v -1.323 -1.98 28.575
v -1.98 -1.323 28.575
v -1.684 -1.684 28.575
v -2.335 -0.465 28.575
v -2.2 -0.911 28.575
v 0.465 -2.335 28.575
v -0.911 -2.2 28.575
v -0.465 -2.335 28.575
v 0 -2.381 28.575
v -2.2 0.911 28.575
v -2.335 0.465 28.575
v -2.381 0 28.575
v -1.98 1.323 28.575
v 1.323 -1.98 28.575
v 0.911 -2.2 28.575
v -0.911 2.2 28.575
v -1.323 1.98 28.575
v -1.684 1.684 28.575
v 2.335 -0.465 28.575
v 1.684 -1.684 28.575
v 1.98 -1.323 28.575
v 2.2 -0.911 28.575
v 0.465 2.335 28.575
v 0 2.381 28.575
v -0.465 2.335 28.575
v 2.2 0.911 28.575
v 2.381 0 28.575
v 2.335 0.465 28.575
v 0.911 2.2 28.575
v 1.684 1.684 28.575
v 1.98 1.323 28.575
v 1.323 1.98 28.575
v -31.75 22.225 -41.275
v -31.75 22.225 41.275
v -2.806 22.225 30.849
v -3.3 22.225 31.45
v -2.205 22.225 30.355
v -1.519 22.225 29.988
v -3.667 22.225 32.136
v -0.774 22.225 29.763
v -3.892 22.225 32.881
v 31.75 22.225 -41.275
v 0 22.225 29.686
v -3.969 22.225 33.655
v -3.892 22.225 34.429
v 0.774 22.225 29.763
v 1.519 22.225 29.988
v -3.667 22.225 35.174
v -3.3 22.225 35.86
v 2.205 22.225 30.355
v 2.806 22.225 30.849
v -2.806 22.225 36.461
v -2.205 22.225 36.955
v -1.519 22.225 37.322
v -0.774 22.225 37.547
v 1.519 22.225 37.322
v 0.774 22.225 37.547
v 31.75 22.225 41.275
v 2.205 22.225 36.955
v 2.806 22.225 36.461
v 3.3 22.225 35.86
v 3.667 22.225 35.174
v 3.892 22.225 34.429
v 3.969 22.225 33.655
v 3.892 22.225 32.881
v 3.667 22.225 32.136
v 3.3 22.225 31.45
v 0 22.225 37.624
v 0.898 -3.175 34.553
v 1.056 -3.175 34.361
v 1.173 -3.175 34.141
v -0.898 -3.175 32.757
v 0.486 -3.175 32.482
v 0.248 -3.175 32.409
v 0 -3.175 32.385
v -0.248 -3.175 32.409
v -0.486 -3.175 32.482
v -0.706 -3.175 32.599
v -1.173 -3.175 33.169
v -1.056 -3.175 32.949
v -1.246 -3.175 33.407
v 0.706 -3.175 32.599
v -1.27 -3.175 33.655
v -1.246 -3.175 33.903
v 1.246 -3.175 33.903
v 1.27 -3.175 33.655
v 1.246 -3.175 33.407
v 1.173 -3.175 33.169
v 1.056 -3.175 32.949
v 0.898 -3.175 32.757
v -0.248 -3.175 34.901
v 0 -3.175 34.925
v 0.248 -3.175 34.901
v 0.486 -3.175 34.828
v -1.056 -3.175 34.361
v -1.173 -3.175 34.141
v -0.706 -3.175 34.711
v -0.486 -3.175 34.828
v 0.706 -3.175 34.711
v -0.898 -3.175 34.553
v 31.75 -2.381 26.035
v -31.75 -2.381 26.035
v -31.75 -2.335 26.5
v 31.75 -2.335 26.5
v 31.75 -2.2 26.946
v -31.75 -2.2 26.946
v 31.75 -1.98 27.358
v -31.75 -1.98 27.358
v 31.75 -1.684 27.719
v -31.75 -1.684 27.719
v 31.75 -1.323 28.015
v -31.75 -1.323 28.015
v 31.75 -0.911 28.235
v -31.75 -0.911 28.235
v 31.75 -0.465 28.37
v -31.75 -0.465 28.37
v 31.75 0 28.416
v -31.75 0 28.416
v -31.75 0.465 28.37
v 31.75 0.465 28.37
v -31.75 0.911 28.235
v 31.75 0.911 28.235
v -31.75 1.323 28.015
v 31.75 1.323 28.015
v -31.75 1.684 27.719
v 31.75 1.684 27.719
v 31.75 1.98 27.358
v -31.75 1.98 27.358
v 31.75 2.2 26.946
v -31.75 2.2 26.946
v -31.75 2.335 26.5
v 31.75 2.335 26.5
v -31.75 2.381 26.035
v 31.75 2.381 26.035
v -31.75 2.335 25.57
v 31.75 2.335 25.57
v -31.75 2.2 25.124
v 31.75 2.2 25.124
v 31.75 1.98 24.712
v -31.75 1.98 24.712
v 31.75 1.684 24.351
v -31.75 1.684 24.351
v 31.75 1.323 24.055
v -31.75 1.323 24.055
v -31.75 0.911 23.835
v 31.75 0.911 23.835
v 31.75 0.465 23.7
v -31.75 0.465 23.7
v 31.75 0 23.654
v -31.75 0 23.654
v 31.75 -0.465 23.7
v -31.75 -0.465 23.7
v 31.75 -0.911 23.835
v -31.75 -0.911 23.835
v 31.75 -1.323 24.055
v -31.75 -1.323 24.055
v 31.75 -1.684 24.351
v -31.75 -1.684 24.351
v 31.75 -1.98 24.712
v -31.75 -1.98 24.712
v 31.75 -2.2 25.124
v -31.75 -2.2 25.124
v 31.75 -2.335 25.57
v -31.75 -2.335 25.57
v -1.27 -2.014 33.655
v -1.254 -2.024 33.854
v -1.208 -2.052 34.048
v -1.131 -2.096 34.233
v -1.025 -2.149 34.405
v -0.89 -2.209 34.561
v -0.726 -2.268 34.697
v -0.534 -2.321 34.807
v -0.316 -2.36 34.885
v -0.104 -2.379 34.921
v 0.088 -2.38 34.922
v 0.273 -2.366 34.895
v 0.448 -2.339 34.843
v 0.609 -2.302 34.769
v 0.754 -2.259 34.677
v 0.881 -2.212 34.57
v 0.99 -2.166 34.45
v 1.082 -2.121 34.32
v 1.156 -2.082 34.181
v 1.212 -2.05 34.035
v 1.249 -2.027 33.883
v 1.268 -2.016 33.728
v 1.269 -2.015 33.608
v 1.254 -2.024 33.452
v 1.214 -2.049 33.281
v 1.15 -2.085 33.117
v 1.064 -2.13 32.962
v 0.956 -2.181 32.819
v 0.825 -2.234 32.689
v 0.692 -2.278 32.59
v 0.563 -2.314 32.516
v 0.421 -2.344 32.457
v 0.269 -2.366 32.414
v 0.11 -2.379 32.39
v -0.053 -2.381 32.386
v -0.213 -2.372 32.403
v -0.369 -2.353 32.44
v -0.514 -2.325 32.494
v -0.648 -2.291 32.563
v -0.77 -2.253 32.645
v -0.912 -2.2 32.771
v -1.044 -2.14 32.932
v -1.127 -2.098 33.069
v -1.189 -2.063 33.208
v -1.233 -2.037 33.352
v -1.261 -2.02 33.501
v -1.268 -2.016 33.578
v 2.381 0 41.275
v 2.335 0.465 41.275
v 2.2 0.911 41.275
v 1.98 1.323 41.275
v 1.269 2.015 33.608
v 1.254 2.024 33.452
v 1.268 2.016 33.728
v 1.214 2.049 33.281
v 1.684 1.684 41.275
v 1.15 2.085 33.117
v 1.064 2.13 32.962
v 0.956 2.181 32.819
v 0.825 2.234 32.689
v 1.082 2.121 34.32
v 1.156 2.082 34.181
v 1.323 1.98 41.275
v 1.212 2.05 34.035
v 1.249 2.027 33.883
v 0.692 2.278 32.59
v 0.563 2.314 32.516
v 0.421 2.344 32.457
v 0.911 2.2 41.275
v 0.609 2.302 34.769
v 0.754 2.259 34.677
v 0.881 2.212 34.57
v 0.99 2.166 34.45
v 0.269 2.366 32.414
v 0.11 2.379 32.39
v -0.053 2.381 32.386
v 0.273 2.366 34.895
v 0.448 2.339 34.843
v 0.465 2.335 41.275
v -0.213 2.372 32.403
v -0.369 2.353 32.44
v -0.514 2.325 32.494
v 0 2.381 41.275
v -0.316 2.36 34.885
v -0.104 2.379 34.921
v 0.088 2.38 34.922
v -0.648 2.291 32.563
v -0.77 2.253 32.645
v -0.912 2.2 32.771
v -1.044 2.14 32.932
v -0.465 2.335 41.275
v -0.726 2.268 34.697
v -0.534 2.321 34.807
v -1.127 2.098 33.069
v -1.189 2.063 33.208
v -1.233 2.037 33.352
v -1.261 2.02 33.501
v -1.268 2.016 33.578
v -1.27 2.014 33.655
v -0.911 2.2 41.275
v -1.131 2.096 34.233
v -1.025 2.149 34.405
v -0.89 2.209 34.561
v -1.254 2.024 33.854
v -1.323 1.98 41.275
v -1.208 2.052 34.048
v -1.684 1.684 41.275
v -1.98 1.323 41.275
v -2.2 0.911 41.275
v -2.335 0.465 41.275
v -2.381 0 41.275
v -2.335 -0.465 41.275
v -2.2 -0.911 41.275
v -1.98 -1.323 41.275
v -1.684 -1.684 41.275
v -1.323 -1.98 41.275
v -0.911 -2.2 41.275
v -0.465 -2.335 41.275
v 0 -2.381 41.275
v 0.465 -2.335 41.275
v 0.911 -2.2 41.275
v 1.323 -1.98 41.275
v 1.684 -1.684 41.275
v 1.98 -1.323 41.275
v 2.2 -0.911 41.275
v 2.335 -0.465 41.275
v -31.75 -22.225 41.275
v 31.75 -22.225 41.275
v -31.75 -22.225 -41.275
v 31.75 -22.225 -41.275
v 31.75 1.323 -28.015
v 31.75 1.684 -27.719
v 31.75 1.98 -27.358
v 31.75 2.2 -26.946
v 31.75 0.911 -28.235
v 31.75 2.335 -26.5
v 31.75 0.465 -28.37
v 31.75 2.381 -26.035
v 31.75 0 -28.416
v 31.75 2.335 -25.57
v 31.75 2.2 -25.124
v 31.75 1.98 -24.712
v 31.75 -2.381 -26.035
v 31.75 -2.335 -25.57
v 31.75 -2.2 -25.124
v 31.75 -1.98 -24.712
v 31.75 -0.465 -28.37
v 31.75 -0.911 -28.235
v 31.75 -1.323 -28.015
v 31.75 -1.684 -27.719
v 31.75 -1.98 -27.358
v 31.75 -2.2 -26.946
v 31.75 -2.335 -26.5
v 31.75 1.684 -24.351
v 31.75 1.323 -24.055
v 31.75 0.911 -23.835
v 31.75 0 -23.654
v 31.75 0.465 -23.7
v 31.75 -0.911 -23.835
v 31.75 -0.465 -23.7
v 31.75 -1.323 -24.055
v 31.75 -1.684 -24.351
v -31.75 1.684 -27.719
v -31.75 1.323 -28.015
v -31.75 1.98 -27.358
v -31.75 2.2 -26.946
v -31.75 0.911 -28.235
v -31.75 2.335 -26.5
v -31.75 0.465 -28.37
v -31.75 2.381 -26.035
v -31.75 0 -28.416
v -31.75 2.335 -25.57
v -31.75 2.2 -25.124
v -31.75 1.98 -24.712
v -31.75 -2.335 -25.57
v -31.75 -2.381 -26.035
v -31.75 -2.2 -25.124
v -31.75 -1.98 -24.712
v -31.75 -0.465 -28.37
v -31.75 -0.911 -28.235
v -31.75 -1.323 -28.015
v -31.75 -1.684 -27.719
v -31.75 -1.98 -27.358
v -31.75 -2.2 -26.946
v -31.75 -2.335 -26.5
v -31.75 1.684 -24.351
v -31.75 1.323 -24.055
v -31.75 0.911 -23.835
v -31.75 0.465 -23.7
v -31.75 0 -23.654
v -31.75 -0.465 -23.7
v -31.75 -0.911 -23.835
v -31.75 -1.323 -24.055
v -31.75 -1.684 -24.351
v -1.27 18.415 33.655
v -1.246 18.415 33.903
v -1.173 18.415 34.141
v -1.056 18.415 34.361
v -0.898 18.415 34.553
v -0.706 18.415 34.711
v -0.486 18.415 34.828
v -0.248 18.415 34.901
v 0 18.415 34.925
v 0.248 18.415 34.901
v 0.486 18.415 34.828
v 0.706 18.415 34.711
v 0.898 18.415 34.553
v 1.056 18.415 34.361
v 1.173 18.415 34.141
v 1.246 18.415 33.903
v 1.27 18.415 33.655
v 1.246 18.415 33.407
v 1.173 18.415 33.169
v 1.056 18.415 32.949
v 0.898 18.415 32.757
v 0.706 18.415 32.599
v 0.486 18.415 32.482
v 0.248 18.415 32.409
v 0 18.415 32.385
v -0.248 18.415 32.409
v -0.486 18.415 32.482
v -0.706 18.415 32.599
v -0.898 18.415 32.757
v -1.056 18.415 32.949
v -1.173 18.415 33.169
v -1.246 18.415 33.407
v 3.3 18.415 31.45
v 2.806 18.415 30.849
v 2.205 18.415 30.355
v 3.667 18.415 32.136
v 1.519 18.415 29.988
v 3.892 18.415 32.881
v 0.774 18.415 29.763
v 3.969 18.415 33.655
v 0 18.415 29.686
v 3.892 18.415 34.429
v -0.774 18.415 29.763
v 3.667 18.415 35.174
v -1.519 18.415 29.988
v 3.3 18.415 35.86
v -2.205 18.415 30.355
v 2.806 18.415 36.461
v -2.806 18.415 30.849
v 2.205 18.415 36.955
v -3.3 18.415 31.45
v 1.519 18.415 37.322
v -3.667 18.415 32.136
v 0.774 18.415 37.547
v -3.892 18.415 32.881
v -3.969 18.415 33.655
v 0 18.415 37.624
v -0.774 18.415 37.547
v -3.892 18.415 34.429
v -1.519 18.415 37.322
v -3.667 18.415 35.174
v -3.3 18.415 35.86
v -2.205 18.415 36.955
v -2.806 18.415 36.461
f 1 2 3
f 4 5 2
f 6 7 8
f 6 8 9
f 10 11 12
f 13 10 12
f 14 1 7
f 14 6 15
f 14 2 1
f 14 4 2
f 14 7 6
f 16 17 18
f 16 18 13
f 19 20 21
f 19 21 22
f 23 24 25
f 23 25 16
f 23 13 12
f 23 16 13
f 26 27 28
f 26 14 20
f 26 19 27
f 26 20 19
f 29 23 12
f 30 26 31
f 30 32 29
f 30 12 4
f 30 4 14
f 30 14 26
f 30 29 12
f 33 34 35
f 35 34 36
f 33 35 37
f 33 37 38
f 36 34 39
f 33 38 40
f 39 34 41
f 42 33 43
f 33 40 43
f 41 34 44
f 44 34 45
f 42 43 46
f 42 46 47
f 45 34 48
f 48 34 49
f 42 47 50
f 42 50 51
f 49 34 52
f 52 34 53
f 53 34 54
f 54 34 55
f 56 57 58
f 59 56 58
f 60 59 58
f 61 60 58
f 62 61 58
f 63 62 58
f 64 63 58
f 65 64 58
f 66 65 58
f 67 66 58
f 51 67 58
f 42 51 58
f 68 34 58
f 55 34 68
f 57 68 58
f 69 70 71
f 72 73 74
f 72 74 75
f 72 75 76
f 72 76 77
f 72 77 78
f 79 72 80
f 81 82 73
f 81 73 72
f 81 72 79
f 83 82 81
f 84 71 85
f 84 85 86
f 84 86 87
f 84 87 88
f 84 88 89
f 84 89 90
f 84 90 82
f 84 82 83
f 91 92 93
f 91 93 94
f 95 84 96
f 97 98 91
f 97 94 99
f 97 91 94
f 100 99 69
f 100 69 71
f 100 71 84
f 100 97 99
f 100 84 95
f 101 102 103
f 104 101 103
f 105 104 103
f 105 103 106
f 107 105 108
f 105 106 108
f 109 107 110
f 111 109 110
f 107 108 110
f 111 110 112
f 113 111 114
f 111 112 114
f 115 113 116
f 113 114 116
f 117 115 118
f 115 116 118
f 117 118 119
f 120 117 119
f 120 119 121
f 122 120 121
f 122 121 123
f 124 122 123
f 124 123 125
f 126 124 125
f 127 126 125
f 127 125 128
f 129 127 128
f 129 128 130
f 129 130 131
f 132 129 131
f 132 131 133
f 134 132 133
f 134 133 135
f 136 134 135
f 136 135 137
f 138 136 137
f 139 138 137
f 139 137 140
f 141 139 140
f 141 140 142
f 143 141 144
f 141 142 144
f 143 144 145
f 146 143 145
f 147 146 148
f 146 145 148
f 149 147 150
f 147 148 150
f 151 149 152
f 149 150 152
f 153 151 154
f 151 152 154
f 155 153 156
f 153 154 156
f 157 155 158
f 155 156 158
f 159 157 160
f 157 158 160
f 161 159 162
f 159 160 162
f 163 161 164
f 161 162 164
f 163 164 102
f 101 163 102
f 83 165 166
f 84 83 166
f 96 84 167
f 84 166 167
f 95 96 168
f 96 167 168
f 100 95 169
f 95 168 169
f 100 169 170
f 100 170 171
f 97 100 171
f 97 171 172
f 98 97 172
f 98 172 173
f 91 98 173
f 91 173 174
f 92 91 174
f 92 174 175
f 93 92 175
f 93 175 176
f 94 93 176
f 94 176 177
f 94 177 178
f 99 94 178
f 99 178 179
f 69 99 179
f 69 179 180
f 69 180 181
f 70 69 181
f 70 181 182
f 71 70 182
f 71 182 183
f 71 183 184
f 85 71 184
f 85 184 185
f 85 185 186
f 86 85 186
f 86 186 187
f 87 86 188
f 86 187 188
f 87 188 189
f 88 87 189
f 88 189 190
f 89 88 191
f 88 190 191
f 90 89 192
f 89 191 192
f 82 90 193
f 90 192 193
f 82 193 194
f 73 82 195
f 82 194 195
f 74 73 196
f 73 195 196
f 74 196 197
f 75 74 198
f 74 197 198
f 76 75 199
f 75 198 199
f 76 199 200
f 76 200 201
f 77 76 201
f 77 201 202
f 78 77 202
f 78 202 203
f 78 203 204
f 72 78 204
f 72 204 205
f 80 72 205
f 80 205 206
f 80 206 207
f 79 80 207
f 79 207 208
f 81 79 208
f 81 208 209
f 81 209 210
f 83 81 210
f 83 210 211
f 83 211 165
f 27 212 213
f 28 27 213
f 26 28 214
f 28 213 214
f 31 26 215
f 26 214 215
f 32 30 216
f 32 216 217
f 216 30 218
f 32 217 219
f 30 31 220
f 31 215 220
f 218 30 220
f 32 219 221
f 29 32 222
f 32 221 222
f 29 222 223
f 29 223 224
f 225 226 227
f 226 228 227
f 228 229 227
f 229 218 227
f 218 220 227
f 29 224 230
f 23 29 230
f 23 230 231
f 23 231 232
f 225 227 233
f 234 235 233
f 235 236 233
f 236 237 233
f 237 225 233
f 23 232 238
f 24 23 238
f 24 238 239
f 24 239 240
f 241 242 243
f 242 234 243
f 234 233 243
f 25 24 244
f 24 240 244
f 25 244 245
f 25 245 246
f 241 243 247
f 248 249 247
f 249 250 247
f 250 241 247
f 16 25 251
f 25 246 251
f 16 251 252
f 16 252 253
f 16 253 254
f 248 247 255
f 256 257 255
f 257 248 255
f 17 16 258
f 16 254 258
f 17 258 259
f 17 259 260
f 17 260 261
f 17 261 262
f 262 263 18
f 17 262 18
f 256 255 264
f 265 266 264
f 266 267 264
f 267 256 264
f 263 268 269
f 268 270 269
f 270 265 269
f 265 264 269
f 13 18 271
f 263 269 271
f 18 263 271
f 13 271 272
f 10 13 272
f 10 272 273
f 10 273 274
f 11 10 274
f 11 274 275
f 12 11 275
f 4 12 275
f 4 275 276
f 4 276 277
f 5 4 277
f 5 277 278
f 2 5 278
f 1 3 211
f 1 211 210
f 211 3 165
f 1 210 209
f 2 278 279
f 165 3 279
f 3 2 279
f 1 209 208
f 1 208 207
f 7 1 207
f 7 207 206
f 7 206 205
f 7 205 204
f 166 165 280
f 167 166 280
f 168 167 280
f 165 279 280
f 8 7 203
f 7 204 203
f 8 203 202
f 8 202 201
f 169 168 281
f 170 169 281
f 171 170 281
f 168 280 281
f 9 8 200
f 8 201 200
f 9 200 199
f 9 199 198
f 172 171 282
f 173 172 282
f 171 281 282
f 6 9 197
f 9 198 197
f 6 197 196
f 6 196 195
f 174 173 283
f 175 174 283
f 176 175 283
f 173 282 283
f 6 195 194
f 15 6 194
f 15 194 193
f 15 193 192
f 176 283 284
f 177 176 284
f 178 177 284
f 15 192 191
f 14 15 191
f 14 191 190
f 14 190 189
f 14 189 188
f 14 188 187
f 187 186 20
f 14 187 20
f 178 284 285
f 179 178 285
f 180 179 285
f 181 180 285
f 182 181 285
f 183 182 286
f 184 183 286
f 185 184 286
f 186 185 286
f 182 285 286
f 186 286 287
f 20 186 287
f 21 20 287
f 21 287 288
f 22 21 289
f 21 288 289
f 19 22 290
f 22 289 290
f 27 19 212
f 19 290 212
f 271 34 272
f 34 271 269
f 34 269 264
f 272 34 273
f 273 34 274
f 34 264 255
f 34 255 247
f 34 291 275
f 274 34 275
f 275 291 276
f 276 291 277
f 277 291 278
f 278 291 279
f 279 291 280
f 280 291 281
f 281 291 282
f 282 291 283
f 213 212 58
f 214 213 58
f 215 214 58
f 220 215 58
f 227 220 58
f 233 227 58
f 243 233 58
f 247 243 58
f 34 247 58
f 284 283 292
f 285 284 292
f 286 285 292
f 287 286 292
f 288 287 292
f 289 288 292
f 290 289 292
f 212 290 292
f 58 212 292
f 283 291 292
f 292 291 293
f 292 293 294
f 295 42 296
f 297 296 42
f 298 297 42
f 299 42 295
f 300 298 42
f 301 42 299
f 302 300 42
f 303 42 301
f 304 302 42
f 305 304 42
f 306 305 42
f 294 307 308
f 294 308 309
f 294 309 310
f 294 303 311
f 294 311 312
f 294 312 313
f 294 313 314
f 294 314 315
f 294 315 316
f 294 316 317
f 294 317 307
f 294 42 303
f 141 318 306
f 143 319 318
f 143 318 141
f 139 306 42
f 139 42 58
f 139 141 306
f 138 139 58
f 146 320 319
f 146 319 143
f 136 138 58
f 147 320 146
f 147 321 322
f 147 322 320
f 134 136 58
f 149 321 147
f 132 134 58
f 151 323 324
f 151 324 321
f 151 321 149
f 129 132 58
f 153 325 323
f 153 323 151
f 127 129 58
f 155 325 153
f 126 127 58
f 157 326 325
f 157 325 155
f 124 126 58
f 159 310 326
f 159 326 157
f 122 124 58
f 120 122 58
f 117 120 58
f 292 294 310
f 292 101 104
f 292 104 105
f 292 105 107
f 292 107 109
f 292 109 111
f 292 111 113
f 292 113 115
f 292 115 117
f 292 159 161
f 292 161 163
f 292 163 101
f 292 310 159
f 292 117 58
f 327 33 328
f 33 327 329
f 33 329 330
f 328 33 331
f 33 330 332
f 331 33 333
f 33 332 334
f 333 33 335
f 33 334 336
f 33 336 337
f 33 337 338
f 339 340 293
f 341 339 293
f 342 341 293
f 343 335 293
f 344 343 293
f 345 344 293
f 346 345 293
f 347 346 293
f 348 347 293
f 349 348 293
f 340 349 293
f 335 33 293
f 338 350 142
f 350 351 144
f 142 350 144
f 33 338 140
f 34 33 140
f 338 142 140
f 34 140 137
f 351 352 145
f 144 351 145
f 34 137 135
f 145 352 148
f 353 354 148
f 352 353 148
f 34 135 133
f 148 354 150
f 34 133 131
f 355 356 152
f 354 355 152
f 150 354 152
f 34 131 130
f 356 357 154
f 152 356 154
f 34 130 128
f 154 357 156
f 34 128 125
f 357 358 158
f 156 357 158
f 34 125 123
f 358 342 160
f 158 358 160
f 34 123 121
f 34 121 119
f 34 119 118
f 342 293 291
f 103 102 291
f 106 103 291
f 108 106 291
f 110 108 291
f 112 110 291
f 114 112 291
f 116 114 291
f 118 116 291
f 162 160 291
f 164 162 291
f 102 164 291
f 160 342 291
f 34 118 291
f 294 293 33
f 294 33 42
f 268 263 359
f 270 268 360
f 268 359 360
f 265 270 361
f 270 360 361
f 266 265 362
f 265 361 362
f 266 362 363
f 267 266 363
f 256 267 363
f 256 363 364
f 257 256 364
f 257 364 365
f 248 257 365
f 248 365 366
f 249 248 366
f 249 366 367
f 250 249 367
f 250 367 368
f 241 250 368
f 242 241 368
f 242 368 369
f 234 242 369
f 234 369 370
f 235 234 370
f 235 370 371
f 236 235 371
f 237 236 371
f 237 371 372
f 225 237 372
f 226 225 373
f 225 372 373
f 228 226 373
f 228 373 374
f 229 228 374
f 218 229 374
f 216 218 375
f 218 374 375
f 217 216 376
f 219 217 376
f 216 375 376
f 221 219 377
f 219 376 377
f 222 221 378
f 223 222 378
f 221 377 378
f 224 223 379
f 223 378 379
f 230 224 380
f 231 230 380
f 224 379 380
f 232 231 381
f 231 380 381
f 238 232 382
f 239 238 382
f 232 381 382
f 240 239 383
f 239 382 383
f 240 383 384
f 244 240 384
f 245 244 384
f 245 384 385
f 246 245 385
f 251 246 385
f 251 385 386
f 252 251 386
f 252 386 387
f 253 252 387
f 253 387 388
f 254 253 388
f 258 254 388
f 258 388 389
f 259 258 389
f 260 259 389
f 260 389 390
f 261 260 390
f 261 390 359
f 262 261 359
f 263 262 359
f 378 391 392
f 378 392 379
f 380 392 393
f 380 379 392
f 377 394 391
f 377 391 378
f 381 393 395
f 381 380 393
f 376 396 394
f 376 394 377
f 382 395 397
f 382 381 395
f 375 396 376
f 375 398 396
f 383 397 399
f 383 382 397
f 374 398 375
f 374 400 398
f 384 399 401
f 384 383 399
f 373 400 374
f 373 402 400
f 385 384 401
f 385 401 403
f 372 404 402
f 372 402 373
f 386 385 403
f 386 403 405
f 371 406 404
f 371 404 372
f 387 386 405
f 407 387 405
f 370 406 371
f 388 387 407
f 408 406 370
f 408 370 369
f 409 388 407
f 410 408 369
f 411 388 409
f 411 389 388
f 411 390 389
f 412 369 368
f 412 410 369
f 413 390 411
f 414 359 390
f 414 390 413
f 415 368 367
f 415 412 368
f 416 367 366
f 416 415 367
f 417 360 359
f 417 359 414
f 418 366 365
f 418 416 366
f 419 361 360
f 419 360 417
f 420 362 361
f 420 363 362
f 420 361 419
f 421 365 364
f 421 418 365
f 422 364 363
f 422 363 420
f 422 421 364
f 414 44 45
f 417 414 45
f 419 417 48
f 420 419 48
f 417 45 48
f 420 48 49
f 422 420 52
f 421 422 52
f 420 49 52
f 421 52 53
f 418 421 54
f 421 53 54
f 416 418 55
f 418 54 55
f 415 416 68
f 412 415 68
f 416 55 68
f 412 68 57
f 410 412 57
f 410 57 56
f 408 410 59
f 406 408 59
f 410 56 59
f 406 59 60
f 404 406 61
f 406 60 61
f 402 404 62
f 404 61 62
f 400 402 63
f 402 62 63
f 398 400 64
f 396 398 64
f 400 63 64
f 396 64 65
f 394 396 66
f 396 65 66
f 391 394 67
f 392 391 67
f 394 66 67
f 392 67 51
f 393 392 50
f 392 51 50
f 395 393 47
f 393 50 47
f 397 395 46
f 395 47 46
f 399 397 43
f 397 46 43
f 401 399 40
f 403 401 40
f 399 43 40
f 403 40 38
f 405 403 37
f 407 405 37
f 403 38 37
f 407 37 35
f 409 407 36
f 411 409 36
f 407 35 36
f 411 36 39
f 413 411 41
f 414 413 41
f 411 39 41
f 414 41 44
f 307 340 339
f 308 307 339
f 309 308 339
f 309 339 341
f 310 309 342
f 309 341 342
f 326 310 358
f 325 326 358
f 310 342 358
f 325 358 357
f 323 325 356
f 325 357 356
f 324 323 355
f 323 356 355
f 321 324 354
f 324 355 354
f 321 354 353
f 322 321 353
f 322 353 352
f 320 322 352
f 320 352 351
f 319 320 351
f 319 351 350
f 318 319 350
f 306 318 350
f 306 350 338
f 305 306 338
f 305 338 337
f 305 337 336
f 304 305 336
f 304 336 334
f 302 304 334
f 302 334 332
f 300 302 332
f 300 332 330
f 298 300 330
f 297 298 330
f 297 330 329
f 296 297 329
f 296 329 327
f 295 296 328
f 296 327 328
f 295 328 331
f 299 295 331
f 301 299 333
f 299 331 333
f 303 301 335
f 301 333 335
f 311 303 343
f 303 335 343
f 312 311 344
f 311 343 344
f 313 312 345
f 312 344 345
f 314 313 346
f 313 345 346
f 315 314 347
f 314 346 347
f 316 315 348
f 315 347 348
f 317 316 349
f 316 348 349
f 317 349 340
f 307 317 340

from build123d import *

# Parameters (mm, degrees)
F0_W     = 63.5
F0_H     = 82.55
F1_DEPTH = 22.225
F2_R     = 2.38125
F3_DEPTH = 12.7
F4_R     = 2.38125
F5_DEPTH = 63.501
F6_R     = 1.27
F7_DEPTH = 25.4
F8_R     = 3.96875
F9_DEPTH = 3.81


with BuildPart() as f1:
    # F0 (on Front) → F1 (new body, symmetric)
    with BuildSketch(Plane.XZ):
        Rectangle(F0_W, F0_H)
    extrude(amount=F1_DEPTH, both=True)

    # F2 (on face) → F3 (cut)
    with BuildSketch(Plane.XY.offset(41.275)):
        Circle(F2_R)
    extrude(amount=-F3_DEPTH, mode=Mode.SUBTRACT)

    # F4 (on face) → F5 (cut, through all)
    with BuildSketch(Plane(origin=(-31.75, 0, 0), x_dir=(0, -1, 0), z_dir=(-1, 0, 0))):
        with Locations((0, 26.035)):
            Circle(F4_R)
        with Locations((0, -26.035)):
            Circle(F4_R)
    extrude(amount=-F5_DEPTH, mode=Mode.SUBTRACT)

    # F6 (on face) → F7 (cut)
    with BuildSketch(Plane(origin=(0, 22.225, 0), x_dir=(-1, 0, 0), z_dir=(0, 1, 0))):
        with Locations((0, 33.655)):
            Circle(F6_R)
    extrude(amount=-F7_DEPTH, mode=Mode.SUBTRACT)

    # F8 (on face) → F9 (cut)
    with BuildSketch(Plane(origin=(0, 22.225, 0), x_dir=(-1, 0, 0), z_dir=(0, 1, 0))):
        with Locations((0, 33.655)):
            Circle(F8_R)
    extrude(amount=-F9_DEPTH, mode=Mode.SUBTRACT)


solid = f1.part
